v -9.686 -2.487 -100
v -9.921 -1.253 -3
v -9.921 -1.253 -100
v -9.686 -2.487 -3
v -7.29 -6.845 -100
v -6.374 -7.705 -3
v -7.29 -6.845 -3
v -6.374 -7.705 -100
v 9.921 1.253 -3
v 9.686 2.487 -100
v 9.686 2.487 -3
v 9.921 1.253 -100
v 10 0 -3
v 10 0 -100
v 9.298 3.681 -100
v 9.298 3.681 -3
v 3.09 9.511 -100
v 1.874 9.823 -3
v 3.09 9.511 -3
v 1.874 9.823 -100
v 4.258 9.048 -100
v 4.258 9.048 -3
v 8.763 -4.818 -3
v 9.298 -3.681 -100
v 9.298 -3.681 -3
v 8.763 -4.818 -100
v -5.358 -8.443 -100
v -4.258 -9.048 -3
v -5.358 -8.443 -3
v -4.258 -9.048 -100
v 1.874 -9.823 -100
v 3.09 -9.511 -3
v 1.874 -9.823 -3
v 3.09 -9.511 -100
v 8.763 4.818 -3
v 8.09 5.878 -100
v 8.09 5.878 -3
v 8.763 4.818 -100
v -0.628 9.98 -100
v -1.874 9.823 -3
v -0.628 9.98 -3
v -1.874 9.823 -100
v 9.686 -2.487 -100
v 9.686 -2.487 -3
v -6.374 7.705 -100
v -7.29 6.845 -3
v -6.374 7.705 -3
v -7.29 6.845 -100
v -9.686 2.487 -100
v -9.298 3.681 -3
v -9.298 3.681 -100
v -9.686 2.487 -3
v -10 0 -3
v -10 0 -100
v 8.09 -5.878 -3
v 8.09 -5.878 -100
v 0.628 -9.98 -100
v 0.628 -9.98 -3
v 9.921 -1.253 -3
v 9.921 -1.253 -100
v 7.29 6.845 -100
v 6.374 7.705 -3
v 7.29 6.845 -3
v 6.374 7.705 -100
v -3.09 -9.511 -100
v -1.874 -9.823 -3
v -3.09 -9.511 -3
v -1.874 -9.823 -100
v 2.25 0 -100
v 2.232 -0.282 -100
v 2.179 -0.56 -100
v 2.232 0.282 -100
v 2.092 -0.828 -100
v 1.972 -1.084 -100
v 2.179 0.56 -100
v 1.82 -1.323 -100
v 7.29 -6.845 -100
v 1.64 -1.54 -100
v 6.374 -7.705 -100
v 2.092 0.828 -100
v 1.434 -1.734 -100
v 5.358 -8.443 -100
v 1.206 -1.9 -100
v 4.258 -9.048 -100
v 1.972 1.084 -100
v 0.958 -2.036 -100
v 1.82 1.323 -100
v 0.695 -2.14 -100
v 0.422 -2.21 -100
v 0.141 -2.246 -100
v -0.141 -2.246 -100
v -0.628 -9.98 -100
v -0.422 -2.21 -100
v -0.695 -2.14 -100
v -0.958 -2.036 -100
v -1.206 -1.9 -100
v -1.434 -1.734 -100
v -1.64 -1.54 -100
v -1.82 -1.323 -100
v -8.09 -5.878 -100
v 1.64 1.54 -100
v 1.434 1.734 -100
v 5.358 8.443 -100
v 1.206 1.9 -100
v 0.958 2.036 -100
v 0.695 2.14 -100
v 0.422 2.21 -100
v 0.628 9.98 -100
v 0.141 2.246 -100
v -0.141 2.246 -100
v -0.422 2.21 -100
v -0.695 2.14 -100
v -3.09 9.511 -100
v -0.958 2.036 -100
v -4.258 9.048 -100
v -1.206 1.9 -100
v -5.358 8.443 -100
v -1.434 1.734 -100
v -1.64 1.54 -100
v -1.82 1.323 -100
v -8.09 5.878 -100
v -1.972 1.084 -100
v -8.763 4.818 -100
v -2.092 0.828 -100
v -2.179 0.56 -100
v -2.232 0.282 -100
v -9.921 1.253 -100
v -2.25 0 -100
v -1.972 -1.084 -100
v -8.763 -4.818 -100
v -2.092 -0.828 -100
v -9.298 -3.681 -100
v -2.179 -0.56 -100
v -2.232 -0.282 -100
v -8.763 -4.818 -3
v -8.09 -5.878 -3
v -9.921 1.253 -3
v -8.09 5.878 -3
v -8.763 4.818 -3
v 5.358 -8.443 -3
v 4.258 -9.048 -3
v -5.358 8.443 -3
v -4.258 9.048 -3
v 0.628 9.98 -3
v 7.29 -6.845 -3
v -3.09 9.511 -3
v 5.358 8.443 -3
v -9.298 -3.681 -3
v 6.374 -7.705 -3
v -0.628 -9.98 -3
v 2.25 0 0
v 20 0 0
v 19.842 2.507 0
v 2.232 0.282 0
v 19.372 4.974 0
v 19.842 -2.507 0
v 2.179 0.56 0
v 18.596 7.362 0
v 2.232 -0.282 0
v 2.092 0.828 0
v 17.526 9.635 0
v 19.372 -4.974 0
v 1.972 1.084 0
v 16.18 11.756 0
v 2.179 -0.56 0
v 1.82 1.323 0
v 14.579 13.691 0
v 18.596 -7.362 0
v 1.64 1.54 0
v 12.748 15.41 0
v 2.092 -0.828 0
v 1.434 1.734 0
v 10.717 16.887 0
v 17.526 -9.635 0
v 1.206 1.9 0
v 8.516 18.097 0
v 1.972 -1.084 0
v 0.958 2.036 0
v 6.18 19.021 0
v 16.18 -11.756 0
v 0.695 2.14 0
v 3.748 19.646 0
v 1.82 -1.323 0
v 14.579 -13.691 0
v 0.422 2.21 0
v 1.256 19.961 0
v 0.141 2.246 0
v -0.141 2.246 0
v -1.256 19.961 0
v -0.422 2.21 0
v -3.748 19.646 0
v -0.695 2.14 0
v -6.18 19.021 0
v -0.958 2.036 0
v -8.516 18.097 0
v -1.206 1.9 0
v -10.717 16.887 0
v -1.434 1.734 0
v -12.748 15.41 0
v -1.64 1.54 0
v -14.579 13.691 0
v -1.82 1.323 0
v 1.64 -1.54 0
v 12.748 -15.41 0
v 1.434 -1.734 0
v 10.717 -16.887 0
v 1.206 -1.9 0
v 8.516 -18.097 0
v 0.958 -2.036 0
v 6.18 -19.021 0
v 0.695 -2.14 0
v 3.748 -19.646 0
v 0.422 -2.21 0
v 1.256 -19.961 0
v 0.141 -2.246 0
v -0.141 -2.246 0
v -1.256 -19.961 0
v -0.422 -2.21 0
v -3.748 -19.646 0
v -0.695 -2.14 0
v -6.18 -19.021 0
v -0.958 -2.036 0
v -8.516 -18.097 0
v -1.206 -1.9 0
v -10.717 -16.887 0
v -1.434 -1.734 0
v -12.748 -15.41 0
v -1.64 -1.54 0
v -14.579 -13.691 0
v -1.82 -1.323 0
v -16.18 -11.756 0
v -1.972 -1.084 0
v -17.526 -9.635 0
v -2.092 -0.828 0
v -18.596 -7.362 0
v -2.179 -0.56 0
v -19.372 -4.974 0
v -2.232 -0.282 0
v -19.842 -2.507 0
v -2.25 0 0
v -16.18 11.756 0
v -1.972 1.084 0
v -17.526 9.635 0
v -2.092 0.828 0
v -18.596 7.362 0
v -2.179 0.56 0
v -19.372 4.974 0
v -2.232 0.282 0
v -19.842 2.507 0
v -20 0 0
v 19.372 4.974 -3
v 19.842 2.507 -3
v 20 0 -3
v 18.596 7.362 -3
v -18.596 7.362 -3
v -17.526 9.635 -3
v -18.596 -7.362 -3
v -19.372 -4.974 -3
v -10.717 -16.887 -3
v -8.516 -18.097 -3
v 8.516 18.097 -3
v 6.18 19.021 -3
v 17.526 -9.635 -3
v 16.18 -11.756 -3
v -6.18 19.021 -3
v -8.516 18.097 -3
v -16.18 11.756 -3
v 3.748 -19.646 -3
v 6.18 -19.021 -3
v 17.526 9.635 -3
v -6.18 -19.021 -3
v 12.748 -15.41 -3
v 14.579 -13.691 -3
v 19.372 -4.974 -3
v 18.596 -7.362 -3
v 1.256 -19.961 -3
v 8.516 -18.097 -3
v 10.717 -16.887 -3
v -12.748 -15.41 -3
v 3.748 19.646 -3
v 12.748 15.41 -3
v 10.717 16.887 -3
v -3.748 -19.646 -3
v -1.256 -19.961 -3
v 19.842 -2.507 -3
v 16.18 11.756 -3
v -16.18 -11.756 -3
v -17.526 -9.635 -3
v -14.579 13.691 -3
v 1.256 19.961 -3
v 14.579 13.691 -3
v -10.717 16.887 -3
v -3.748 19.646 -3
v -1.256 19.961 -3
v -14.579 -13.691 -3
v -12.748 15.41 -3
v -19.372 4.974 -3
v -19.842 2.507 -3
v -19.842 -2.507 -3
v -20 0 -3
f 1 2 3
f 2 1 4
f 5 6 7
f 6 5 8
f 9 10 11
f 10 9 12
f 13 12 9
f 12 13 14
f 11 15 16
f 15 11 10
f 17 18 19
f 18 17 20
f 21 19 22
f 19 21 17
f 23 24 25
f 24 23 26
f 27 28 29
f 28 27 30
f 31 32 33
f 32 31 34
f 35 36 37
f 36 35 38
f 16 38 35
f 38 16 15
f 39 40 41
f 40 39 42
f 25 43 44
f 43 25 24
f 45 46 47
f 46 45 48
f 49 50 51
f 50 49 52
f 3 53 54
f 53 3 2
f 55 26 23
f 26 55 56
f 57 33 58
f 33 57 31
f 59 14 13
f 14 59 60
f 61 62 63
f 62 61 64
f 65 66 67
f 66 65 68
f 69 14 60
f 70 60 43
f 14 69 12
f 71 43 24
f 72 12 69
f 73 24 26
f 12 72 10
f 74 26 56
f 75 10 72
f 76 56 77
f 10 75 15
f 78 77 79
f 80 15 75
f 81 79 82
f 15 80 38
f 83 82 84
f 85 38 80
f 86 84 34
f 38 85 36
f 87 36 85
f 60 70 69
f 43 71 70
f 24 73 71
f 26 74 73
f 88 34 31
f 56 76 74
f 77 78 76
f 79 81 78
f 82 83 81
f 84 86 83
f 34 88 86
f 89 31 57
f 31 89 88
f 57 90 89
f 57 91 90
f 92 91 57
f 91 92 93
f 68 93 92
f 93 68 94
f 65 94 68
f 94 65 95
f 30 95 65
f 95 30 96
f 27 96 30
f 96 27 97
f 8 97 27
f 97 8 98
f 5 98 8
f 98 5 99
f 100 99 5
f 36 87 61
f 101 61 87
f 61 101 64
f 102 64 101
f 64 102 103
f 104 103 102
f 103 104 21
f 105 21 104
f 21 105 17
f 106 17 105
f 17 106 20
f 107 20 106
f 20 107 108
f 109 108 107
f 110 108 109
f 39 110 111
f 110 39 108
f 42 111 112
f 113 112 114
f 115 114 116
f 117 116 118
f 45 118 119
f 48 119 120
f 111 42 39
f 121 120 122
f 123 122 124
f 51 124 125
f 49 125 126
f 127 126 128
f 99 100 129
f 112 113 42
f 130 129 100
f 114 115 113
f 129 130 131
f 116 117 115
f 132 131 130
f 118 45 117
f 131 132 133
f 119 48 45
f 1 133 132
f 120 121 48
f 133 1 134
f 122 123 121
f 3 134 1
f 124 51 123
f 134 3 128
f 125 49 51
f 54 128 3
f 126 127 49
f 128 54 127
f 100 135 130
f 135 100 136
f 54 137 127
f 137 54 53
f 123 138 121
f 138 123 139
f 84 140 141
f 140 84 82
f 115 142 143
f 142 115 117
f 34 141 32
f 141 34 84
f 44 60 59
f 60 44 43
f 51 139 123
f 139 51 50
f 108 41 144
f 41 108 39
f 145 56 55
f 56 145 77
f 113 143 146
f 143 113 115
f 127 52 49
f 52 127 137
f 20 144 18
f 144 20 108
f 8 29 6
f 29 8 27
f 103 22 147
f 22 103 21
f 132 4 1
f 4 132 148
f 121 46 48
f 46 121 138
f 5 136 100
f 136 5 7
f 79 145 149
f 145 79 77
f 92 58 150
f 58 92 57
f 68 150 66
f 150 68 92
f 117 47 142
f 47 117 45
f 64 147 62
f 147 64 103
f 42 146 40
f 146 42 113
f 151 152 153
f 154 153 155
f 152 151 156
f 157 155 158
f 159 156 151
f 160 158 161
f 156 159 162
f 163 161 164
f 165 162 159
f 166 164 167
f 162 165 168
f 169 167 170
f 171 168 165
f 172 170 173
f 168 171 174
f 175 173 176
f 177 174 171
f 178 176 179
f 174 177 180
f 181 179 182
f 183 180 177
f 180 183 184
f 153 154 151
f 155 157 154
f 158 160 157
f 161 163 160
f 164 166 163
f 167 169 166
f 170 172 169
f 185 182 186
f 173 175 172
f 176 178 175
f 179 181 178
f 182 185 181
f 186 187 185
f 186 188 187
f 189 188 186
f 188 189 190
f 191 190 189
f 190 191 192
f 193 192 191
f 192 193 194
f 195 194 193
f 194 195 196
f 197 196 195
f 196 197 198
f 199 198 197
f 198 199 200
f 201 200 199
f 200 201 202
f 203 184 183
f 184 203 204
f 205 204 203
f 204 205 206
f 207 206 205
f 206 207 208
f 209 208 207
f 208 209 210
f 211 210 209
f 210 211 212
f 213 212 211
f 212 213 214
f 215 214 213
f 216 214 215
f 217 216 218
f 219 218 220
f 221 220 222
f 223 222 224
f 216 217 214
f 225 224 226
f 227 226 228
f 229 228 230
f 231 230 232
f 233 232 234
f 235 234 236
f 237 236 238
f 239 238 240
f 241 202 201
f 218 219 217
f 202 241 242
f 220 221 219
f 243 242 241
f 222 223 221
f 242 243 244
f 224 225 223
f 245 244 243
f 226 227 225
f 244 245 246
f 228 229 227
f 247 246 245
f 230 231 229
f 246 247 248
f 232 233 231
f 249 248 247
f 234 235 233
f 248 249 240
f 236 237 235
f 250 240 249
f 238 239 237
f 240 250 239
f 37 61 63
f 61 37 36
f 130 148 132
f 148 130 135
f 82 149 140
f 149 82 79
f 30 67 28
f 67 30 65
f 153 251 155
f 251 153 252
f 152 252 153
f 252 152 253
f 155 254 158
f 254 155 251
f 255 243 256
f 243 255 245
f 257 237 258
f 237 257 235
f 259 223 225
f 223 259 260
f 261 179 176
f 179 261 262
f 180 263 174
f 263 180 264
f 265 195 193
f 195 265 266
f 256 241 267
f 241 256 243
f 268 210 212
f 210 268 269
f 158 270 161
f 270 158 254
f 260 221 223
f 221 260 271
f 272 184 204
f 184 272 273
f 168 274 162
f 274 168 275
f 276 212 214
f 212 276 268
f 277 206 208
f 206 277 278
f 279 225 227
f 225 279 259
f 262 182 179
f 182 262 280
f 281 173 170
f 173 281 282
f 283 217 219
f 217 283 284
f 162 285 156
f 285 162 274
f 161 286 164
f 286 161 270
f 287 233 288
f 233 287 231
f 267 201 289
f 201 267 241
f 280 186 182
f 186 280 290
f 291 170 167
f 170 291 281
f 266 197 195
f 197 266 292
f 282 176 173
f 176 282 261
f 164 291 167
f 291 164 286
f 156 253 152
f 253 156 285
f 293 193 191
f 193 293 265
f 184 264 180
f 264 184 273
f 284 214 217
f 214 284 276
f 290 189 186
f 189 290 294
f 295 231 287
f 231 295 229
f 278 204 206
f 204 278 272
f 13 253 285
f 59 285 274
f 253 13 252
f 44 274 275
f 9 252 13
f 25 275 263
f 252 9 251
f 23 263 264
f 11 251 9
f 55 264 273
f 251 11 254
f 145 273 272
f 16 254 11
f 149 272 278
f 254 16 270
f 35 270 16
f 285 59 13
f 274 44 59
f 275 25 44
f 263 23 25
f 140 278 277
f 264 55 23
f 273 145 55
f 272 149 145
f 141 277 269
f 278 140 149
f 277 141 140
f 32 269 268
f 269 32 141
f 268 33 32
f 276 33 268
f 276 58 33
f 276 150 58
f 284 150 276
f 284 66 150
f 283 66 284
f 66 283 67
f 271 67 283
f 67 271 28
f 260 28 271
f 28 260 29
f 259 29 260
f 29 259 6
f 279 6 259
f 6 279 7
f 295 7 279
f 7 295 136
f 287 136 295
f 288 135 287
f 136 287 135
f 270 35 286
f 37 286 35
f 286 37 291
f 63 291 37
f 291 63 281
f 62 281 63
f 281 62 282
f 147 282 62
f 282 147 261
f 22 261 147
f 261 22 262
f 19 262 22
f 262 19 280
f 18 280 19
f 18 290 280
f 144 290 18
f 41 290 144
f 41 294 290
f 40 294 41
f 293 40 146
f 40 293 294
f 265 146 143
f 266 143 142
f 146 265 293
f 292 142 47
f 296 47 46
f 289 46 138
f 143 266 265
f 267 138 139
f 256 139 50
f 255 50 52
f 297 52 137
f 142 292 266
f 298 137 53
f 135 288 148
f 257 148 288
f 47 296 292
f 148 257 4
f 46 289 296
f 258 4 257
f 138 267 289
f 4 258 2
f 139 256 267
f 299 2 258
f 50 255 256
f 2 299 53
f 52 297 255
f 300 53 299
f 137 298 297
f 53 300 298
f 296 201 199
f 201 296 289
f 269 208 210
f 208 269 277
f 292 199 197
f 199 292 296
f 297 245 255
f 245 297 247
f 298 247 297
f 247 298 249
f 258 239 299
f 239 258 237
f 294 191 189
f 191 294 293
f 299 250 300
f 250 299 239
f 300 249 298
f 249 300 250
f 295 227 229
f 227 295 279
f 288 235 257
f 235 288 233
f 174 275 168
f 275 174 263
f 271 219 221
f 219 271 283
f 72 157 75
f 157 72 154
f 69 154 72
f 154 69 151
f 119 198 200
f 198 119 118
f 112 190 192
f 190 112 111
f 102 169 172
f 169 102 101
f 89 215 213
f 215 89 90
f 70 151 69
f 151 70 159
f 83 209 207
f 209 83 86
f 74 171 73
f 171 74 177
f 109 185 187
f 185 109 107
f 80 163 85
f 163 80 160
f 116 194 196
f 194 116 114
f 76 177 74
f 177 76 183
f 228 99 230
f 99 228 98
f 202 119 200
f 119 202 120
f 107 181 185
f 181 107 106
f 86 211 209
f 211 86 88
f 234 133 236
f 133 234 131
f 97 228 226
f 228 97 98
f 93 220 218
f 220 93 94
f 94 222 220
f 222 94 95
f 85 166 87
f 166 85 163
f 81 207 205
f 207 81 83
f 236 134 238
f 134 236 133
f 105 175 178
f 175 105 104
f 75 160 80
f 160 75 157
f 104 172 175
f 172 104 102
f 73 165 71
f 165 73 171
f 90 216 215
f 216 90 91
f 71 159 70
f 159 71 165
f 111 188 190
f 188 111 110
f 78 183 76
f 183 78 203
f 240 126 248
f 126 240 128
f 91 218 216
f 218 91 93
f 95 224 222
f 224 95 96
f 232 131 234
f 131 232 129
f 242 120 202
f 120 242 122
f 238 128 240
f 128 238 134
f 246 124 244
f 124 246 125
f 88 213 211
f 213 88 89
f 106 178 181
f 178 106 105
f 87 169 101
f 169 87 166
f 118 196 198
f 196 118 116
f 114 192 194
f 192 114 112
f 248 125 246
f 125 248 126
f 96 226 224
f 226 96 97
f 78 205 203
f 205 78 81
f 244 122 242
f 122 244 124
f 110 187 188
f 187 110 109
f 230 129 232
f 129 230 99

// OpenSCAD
$fn = 50;


difference() {
	union() {
		translate(v = [0, 0, -100.0000000000]) {
			cylinder(h = 100, r = 10.0000000000);
		}
		translate(v = [0, 0, -3.0000000000]) {
			cylinder(h = 3, r = 20.0000000000);
		}
	}
	union() {
		#translate(v = [0, 0, -100]) {
			cylinder(h = 100, r = 2.2500000000);
		}
	}
}
